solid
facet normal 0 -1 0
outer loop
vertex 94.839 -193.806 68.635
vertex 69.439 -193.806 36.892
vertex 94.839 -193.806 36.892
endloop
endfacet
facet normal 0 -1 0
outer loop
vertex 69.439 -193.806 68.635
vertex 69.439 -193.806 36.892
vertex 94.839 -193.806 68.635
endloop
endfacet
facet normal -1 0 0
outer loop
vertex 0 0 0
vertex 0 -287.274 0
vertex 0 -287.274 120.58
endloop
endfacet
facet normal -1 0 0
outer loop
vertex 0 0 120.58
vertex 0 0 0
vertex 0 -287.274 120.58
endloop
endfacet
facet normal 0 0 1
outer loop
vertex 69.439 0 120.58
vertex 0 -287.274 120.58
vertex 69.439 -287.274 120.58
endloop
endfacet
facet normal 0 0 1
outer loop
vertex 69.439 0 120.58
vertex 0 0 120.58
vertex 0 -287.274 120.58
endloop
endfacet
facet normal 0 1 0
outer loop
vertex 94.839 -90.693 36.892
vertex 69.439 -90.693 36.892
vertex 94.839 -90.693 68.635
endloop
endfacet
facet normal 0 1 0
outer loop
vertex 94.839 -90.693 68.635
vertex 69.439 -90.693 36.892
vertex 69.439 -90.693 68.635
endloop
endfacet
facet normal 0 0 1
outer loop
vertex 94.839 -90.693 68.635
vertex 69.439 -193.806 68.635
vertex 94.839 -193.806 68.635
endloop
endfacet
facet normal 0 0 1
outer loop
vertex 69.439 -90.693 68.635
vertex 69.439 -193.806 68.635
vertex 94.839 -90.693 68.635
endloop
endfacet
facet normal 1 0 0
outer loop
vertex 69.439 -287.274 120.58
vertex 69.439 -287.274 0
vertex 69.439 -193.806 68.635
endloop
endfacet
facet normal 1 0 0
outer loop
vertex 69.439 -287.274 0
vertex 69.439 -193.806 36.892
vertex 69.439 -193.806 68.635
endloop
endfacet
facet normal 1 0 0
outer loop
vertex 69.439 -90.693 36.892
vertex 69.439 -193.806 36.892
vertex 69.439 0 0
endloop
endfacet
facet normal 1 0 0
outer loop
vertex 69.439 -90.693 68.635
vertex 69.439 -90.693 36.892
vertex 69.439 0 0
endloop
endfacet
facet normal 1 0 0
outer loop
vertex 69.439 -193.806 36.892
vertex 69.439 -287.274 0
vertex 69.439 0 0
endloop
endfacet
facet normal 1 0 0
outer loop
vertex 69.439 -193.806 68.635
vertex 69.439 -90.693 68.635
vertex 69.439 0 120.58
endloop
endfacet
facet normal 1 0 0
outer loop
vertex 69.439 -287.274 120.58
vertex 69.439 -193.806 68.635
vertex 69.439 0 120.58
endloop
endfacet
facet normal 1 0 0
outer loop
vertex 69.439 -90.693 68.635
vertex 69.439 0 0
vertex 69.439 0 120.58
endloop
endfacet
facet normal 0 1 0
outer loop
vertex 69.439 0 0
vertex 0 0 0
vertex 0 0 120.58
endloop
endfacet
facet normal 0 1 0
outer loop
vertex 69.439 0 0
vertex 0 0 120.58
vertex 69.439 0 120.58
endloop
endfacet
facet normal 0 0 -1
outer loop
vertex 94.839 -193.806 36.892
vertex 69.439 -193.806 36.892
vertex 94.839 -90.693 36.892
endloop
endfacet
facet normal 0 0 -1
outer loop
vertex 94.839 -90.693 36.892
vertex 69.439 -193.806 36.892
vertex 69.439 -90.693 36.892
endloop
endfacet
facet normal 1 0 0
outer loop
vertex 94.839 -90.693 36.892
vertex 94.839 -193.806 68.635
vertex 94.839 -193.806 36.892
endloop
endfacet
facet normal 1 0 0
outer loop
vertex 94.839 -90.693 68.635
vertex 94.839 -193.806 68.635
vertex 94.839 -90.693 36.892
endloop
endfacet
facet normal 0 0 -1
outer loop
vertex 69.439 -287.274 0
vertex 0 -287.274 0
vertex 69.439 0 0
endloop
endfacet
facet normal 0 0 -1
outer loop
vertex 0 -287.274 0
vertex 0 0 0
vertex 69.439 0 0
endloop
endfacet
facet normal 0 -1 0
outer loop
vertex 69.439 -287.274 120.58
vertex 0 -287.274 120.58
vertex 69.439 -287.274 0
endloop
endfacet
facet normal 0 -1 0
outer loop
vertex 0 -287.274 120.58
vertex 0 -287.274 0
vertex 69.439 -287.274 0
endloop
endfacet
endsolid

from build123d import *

# Parameters (mm, degrees)
F0_W     = 69.4388896227
F0_H     = 40.5697822571
F1_DEPTH = 181.864
F3_DEPTH = 80.01
F4_DEPTH = 105.41
F5_W     = 103.1131744385
F5_H     = 31.7430943251
F6_DEPTH = 25.4


# Not quite as in the source:
# - the program builds the solid bodies; features that only make, move or delete a surface that nothing else refers to are left out


with BuildPart() as f1:
    # F0 (on Front) → F1 (new body)
    with BuildSketch(Plane.XZ):
        with Locations((34.7194448113, 20.2848911285)):
            Rectangle(F0_W, F0_H)
    extrude(amount=F1_DEPTH)

    # F3 (add): a face of the model
    f3_faces = [f1.faces().sort_by_distance(p)[0] for p in [
        (34.7194448113, -90.932, 40.5697822571),
    ]]
    extrude(f3_faces, amount=F3_DEPTH)

    # F4 (add): a face of the model
    f4_faces = [f1.faces().sort_by_distance(p)[0] for p in [
        (34.7194448113, -181.864, 60.2898911285),
    ]]
    extrude(f4_faces, amount=F4_DEPTH)

    # F5 (on face) → F6 (join)
    with BuildSketch(Plane.YZ.offset(69.4388896227)):
        with Locations((-142.2493308783, 52.7632534504)):
            Rectangle(F5_W, F5_H)
    extrude(amount=F6_DEPTH)


solid = f1.part
